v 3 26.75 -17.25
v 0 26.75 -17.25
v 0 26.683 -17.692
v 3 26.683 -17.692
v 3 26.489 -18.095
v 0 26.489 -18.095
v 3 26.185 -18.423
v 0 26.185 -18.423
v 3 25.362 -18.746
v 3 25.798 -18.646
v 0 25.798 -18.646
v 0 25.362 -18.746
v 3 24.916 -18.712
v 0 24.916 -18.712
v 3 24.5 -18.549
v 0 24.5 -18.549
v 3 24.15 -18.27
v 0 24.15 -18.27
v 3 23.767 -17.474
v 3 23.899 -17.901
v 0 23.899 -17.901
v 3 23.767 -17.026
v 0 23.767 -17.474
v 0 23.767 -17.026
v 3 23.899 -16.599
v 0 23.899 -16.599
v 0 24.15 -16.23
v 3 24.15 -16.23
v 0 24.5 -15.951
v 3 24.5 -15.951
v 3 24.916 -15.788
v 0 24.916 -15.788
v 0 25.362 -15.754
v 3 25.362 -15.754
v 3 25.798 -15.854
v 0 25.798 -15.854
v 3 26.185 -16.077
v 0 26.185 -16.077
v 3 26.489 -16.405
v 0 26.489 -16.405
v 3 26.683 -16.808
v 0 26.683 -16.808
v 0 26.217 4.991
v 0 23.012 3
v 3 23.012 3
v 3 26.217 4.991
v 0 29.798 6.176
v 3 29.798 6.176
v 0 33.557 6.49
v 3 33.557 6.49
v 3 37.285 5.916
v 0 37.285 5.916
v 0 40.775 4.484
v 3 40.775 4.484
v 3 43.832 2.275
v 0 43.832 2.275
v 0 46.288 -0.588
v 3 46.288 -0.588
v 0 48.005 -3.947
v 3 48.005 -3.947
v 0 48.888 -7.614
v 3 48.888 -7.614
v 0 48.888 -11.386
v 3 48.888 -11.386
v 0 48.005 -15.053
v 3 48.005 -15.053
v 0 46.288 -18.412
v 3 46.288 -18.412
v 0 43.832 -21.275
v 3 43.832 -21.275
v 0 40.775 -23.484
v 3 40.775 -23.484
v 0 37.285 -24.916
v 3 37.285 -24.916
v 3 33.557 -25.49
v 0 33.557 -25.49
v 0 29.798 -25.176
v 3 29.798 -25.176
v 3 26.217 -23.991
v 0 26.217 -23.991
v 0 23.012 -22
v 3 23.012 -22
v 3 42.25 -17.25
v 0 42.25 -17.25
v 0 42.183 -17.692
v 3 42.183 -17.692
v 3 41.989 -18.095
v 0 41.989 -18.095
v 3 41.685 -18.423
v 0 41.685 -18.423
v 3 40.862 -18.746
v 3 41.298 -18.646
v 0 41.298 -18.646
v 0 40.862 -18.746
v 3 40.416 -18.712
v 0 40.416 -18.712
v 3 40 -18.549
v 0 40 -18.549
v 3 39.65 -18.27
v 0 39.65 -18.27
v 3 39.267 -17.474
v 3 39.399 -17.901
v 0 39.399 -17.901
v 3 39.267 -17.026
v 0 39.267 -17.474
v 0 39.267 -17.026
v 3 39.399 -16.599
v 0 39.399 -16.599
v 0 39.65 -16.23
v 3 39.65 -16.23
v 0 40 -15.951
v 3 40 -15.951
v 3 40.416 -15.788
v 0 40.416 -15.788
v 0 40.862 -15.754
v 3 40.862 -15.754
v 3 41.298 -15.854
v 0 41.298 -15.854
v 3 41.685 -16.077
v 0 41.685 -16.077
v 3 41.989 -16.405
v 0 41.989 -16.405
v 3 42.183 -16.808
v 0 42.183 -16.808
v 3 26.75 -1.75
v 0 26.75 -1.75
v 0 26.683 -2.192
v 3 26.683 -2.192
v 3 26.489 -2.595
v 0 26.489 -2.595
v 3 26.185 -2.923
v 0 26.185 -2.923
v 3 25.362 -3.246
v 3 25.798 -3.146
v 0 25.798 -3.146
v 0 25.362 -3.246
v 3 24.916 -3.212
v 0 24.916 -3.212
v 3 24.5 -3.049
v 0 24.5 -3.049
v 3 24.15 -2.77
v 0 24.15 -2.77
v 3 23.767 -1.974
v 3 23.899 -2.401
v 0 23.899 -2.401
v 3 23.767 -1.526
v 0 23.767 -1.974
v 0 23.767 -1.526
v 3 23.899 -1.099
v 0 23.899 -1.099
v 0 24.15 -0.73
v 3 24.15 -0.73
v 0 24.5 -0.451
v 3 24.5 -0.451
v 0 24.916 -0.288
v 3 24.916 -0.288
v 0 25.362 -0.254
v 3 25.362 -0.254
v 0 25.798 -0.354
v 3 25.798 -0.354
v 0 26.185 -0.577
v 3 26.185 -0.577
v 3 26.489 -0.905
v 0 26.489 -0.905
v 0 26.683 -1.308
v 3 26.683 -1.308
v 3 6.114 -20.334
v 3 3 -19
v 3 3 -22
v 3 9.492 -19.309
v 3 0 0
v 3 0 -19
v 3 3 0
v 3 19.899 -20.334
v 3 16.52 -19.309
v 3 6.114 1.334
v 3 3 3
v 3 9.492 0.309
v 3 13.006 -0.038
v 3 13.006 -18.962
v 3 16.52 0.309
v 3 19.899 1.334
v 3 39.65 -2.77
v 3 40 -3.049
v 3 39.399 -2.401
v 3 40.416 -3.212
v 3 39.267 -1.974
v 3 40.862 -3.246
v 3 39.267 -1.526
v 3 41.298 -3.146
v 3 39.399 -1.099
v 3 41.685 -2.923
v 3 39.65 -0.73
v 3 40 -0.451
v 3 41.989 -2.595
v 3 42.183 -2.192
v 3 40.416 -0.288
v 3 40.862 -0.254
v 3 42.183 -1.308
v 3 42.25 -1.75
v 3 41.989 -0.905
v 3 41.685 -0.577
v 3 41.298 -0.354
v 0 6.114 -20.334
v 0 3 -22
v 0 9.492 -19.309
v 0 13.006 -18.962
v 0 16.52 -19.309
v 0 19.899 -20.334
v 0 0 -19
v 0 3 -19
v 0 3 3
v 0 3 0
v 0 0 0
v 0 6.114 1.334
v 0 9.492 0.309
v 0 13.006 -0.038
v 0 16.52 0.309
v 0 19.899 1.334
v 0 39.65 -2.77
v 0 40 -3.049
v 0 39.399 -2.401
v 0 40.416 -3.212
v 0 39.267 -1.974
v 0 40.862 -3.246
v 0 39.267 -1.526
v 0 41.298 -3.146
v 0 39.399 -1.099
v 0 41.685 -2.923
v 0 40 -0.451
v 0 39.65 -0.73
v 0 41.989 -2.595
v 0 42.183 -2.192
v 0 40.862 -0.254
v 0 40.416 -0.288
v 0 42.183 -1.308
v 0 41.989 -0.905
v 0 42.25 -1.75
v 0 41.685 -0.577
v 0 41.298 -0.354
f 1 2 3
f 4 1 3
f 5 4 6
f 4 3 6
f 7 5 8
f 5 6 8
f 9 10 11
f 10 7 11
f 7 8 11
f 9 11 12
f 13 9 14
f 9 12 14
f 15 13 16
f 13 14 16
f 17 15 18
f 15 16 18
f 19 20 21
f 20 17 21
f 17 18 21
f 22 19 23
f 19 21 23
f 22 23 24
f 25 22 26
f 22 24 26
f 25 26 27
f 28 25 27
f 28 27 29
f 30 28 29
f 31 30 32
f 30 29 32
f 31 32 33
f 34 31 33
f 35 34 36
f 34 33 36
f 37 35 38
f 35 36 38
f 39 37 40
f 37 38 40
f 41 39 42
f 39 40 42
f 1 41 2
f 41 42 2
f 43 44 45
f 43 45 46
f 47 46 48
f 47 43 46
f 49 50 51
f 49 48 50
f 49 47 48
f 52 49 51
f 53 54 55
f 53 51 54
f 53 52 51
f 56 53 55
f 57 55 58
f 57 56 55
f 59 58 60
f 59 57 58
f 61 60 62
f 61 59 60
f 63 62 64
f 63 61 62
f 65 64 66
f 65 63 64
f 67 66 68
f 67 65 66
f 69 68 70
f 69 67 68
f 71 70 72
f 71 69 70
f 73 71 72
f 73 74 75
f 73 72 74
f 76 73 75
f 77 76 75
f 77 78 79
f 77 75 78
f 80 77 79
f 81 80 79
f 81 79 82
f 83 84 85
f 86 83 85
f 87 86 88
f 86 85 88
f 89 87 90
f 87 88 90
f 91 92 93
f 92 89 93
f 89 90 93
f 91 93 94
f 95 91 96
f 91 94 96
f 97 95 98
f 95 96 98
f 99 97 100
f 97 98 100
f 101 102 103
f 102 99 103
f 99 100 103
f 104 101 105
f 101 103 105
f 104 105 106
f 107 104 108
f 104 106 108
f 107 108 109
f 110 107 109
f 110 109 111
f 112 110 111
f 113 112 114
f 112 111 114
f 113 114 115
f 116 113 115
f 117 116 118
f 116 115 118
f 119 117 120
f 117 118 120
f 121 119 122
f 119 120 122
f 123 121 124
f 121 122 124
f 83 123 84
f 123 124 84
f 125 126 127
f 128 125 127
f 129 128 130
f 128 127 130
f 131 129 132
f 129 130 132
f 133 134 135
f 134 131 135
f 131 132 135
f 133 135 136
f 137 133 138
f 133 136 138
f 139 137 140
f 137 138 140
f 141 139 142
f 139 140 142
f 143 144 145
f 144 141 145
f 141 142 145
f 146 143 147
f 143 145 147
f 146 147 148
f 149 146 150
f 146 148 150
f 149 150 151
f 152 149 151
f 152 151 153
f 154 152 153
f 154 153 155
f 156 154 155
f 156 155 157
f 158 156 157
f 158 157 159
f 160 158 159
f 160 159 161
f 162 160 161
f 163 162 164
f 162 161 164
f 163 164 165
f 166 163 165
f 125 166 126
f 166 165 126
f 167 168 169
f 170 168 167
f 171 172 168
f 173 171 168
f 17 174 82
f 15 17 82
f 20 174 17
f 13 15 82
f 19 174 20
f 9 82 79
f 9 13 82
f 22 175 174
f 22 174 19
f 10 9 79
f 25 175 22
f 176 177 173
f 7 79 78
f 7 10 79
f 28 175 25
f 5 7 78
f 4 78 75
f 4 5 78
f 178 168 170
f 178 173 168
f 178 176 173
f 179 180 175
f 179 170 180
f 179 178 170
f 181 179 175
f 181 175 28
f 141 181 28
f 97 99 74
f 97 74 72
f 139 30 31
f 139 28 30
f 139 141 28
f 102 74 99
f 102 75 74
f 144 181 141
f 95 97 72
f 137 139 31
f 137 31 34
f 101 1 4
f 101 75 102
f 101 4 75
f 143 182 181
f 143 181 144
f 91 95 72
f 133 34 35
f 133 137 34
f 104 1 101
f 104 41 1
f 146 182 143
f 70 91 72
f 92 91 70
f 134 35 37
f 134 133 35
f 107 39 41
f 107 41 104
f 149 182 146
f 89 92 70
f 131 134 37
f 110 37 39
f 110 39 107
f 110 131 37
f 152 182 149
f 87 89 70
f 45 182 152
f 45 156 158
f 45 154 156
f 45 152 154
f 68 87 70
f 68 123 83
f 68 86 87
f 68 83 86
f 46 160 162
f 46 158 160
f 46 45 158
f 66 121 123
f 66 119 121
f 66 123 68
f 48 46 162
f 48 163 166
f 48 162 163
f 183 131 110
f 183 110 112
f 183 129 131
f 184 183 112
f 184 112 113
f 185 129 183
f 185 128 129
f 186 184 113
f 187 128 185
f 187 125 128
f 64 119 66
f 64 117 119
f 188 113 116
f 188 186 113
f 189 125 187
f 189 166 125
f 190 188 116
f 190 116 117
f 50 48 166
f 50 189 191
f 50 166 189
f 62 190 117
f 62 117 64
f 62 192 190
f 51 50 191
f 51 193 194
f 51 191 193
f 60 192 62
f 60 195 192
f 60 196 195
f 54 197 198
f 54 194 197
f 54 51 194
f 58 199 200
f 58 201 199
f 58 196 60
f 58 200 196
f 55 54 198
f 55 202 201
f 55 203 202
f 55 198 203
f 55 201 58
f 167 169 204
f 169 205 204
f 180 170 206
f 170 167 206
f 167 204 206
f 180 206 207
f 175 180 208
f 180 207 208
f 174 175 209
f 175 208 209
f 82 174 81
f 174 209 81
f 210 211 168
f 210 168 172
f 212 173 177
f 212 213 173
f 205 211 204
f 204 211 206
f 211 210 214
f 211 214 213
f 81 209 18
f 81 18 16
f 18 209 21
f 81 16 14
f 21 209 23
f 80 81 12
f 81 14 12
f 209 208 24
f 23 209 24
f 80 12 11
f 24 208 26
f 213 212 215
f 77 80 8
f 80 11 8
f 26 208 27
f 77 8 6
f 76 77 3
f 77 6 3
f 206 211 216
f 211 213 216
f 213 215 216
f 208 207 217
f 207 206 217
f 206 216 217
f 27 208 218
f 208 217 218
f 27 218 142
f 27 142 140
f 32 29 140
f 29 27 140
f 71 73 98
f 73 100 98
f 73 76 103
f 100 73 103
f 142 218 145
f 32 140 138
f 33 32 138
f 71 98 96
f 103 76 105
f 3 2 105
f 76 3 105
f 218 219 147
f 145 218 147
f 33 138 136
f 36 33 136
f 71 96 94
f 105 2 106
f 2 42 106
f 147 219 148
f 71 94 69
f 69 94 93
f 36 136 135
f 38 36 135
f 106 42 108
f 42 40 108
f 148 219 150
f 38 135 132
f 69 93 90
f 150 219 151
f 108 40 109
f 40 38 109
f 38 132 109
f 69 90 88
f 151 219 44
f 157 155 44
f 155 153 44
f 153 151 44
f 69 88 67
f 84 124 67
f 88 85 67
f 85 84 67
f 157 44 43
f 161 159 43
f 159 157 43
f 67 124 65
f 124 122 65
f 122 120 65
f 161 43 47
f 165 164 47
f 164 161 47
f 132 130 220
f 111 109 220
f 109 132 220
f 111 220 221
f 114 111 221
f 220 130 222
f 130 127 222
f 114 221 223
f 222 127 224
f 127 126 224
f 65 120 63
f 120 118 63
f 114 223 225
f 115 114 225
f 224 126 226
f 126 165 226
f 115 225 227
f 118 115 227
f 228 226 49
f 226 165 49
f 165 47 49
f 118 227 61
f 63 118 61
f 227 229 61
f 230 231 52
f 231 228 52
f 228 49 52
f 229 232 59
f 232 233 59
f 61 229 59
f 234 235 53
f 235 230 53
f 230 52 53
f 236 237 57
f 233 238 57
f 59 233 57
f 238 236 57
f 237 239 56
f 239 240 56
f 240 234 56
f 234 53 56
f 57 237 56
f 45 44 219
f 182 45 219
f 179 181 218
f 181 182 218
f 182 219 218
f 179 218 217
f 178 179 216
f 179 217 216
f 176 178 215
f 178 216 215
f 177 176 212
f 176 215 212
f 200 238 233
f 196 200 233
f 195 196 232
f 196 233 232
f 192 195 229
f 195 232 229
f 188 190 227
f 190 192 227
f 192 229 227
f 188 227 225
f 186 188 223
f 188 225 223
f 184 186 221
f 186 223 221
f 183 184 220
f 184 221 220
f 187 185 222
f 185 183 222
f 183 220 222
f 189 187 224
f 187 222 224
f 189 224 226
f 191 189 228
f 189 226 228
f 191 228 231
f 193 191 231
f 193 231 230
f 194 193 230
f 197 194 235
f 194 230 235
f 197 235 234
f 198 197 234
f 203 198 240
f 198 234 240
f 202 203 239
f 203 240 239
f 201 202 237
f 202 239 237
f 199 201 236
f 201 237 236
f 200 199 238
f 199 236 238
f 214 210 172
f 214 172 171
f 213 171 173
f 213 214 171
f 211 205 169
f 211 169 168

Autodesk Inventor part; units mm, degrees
ref_plane "YZ Plane" through (0, 0, 0) normal (1, 0, 0) x (0, 1, 0)
ref_plane "XZ Plane" through (0, 0, 0) normal (0, 1, 0) x (-1, 0, 0)
ref_plane "XY Plane" through (0, 0, 0) normal (0, 0, 1) x (1, 0, 0)
sketch "Sketch1" plane through (0, 0, 0) normal (1, 0, 0) x (0, 1, 0)
  line L0 (0, 0) -> (3, 0)
  line L1 (3, 0) -> (3, -19) construction
  line L2 (3, -19) -> (0, -19)
  line L3 (0, -19) -> (0, 0)
  line L4 (3, 0) -> (3, 3) construction
  line L5 (3, 3) -> (23.0125, 3) construction
  line L6 (33, 3) -> (33, -22) construction
  line L7 (33, -22) -> (23.0125, -22) construction
  line L8 (3, -22) -> (3, -19)
  line L9 (33, -9.5) -> (40.75, -9.5) construction
  line L10 (40.75, -9.5) -> (40.75, -17.25) construction
  line L11 (40.75, -17.25) -> (33, -17.25) construction
  line L12 (33, -17.25) -> (33, -9.5) construction
  circle A0 centre (40.75, -17.25) radius 1.5
  line L13 (40.75, -17.25) -> (25.25, -17.25) construction
  line L14 (25.25, -17.25) -> (25.25, -1.75) construction
  line L15 (25.25, -1.75) -> (40.75, -1.75) construction
  line L16 (40.75, -1.75) -> (40.75, -17.25) construction
  circle A1 centre (25.25, -17.25) radius 1.5
  circle A2 centre (25.25, -1.75) radius 1.5
  circle A3 centre (40.75, -1.75) radius 1.5
  arc A4 (23.0125, -22) -> (23.0125, 3) centre (33, -9.5) ccw
  line L17 (23.0125, 3) -> (33, 3) construction
  line L18 (23.0125, -22) -> (3, -22) construction
  arc A5 (3, 3) -> (23.0125, 3) centre (13.0063, 17.9624) ccw
  arc A6 (23.0125, -22) -> (3, -22) centre (13.0063, -36.9624) ccw
  line L19 (3, 0) -> (3, 3)
  line L20 (3, -19) -> (3, 0) construction
  arc A7 (23.0125, 3) -> (23.0125, -22) centre (33, -9.5) ccw construction
  point P0 (23.0125, -22)
  point P1 (23.0125, 3)
  dimension "d0" = 3
  dimension "d1" = 19
  dimension "d2" = 3
  dimension "d3" = 30
  dimension "d4" = 25
  dimension "d5" = 7.75
  dimension "d6" = 7.75
  dimension "d7" = 3
  dimension "d8" = 15.5
  dimension "d9" = 15.5
  dimension "d10" = 3
  dimension "d11" = 3
  dimension "d12" = 3
  dimension "d13" = 32
  dimension "d16" = 18
  dimension "d17" = 18
extrude "Extrusion1" add sketch "Sketch1" along normal blind 3
properties part number "soporteEncoder" material "PMMA Plastic"
